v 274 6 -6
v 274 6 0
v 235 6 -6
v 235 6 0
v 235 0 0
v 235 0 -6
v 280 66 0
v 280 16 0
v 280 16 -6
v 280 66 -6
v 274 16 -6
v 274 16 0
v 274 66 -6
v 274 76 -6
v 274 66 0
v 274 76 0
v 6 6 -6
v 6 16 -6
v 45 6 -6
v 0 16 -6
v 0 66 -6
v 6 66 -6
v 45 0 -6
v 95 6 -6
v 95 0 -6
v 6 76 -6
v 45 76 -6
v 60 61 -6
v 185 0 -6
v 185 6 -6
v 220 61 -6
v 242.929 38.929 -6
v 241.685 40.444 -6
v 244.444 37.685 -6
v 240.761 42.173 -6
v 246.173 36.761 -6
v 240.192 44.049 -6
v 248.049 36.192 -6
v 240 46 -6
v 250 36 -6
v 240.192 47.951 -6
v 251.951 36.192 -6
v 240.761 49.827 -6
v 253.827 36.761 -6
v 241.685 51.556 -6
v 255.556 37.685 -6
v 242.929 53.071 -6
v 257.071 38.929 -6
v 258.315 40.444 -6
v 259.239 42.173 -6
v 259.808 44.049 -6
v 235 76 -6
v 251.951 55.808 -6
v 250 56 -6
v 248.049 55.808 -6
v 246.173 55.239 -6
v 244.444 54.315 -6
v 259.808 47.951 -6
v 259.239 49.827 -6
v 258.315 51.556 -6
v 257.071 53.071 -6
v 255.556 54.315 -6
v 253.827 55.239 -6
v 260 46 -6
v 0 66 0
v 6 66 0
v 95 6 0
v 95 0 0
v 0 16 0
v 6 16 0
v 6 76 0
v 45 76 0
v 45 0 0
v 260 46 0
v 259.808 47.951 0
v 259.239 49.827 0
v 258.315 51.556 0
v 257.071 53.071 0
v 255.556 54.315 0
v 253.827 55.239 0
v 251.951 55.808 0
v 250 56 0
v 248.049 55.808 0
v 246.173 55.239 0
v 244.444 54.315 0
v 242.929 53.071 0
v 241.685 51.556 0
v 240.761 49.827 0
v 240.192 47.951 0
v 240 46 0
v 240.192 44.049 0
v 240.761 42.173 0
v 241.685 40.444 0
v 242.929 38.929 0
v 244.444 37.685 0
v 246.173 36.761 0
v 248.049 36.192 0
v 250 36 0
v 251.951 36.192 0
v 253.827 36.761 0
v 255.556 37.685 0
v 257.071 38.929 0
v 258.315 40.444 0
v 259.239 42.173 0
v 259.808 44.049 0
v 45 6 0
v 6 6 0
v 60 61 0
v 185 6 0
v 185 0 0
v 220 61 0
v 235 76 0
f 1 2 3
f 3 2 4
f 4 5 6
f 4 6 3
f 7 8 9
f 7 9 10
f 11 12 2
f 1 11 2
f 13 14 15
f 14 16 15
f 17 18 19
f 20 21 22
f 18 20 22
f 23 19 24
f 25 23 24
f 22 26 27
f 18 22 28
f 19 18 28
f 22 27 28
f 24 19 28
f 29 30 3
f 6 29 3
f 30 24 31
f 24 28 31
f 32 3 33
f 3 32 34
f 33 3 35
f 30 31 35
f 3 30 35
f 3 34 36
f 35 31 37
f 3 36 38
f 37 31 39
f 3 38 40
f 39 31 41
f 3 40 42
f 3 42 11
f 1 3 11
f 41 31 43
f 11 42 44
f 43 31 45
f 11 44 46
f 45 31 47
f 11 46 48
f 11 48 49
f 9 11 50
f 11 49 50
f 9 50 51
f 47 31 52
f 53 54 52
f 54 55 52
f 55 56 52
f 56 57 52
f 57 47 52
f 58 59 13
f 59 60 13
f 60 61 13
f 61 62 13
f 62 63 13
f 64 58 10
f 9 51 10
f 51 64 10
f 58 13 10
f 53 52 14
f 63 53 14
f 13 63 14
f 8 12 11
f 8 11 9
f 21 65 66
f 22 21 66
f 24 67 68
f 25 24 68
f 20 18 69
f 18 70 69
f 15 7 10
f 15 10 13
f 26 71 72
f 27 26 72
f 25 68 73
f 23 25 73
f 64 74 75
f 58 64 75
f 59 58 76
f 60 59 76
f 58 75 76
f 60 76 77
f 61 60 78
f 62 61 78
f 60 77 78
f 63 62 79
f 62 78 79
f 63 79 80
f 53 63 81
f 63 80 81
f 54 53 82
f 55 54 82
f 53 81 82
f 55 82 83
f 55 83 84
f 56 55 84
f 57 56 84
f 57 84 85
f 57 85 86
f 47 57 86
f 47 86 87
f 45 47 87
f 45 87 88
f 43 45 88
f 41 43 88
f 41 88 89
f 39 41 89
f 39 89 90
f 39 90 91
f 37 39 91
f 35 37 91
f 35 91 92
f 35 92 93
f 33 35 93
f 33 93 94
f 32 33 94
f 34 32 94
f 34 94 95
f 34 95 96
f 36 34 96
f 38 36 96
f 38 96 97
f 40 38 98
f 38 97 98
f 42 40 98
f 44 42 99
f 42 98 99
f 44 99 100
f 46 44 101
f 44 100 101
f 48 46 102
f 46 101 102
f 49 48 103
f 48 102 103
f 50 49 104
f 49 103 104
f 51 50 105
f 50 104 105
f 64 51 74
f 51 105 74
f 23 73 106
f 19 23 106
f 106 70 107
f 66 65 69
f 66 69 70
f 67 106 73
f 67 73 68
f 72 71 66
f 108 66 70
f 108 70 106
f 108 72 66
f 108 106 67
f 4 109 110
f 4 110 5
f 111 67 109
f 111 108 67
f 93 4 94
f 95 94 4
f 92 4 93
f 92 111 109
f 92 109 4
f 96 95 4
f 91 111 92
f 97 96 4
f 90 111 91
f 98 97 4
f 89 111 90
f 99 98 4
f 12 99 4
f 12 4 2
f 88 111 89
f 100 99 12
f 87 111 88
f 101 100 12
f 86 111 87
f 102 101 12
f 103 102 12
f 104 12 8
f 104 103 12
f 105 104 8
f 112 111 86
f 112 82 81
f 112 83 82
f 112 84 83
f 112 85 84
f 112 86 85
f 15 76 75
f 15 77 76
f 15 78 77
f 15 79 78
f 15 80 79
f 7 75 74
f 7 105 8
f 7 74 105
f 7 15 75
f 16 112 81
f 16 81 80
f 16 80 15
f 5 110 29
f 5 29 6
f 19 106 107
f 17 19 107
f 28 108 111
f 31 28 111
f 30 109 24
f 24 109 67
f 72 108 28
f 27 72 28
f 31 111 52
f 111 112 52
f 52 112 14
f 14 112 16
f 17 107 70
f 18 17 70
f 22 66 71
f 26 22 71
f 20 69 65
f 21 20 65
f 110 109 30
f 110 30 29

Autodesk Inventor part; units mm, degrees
ref_plane "YZ Plane" through (0, 0, 0) normal (1, 0, 0) x (0, 1, 0)
ref_plane "XZ Plane" through (0, 0, 0) normal (0, 1, 0) x (-1, 0, 0)
ref_plane "XY Plane" through (0, 0, 0) normal (0, 0, 1) x (1, 0, 0)
sketch "Sketch1" plane through (0, 0, 0) normal (0, 0, 1) x (1, 0, 0)
  line L0 (280, 76) -> (280, 66) construction
  line L1 (280, 76) -> (274, 76) construction
  line L2 (274, 76) -> (274, 66) construction
  line L3 (280, 66) -> (274, 66) construction
  line L4 (280, 16) -> (280, 6) construction
  line L5 (280, 16) -> (274, 16) construction
  line L6 (274, 16) -> (274, 6) construction
  line L7 (280, 6) -> (274, 6) construction
  line L8 (235, 6) -> (235, 0) construction
  line L9 (235, 0) -> (280, 0) construction
  line L10 (280, 0) -> (280, 6) construction
  line L11 (235, 6) -> (280, 6) construction
  line L12 (95, 6) -> (95, 0) construction
  line L13 (95, 0) -> (185, 0) construction
  line L14 (185, 0) -> (185, 6) construction
  line L15 (95, 6) -> (185, 6) construction
  line L16 (45, 0) -> (45, 6) construction
  line L17 (0, 6) -> (45, 6) construction
  line L18 (0, 0) -> (0, 6) construction
  line L19 (0, 0) -> (45, 0) construction
  line L20 (0, 16) -> (0, 6) construction
  line L21 (0, 6) -> (6, 6) construction
  line L22 (6, 16) -> (6, 6) construction
  line L23 (0, 16) -> (6, 16) construction
  line L24 (0, 76) -> (0, 66) construction
  line L25 (0, 66) -> (6, 66) construction
  line L26 (6, 76) -> (6, 66) construction
  line L27 (0, 76) -> (6, 76) construction
  line L28 (274, 16) -> (280, 16)
  line L29 (280, 16) -> (280, 66)
  line L30 (280, 66) -> (274, 66)
  line L31 (6, 16) -> (0, 16)
  line L32 (0, 16) -> (0, 66)
  line L33 (0, 66) -> (6, 66)
  line L34 (95, 6) -> (95, 0)
  line L35 (95, 0) -> (45, 0)
  line L36 (45, 0) -> (45, 6)
  line L37 (185, 6) -> (185, 0)
  line L38 (185, 0) -> (235, 0)
  line L39 (235, 0) -> (235, 6)
  line L40 (274, 76) -> (274, 66)
  line L41 (274, 16) -> (274, 6)
  line L42 (274, 6) -> (235, 6)
  line L43 (185, 6) -> (95, 6)
  line L44 (45, 6) -> (6, 6)
  line L45 (6, 6) -> (6, 16)
  line L46 (6, 66) -> (6, 76)
  line L47 (45, 76) -> (45, 61)
  line L48 (45, 61) -> (235, 61)
  line L49 (235, 61) -> (235, 76)
  line L50 (6, 76) -> (45, 76)
  line L51 (235, 76) -> (274, 76)
extrude "Extrusion1" add sketch "Sketch1" against normal blind 6
chamfer "Chamfer1" distance 15 angle 45 2 edges at (45, 61, -3) (235, 61, -3)
sketch "Sketch2" plane through (0, 0, 0) normal (0, 0, 1) x (1, 0, 0)
  circle A0 centre (250, 46) radius 10
  line L0 (235, 76) -> (274, 76) projected
  line L1 (280, 66) -> (280, 16) projected
  point P0 (0, 0)
  dimension "d6" = 20
  dimension "d7" = 30
  dimension "d8" = 30
extrude "Extrusion2" cut sketch "Sketch2" against normal blind 6
properties part number "Lateral"
